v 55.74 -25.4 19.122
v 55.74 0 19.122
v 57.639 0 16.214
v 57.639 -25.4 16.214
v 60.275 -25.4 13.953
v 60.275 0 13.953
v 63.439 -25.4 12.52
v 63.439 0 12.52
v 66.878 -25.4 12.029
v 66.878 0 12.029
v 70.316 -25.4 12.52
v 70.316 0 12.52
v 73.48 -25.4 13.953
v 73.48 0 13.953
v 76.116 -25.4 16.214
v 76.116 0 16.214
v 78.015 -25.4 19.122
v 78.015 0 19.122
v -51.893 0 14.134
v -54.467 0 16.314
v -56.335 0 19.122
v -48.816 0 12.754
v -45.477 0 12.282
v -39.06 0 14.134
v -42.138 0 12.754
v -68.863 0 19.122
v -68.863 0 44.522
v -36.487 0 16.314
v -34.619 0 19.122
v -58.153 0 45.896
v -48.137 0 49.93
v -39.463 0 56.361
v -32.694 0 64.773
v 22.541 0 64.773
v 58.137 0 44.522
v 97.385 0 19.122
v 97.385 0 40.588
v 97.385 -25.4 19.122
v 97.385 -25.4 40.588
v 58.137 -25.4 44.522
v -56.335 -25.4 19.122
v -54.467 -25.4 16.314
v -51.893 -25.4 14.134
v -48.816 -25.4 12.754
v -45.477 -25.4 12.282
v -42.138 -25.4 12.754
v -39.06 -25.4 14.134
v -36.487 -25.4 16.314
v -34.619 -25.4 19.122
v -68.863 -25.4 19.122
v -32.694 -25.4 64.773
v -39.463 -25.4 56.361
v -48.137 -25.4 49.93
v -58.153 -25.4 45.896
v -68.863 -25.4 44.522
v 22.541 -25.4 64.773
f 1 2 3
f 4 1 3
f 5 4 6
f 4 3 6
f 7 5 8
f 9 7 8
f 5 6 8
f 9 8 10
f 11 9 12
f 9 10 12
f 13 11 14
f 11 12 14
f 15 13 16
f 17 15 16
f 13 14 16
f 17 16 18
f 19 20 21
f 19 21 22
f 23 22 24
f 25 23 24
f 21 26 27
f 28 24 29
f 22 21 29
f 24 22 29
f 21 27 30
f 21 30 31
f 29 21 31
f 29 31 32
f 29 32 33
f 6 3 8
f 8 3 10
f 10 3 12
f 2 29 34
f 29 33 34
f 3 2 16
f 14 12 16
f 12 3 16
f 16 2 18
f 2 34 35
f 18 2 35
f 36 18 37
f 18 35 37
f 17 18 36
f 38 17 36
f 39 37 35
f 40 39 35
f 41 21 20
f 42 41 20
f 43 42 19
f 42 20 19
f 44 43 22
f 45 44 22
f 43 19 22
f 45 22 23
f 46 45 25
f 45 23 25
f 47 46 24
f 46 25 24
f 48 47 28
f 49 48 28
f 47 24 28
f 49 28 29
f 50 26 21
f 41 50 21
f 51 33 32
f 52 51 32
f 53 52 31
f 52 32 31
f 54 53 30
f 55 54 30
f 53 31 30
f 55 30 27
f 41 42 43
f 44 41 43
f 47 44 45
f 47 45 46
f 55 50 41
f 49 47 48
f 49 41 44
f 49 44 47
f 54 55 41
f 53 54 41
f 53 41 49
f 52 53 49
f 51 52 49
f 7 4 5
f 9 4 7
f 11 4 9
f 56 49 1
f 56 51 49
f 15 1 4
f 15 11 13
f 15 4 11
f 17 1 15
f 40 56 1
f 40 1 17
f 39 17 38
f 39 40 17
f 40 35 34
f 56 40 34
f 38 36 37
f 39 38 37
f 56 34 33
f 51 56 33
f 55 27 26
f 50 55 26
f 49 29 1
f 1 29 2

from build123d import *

# Parameters (mm, degrees)
F1_DEPTH = 25.4
F2_DEPTH = 25.4
F3_DEPTH = 25.4


with BuildPart() as f1:
    # F0 (on Front) → F1 (new body)
    with BuildSketch(Plane.XZ):
        with BuildLine():
            ThreePointArc((-32.6936654747, 64.7734031081), (-48.13655305, 49.9296563149), (-68.8628588319, 44.5222683907))
            Line((-68.8628588319, 44.5222683907), (58.1371411681, 44.5222683907))
            Line((58.1371411681, 44.5222683907), (22.5408878177, 64.7734031081))
            Line((22.5408878177, 64.7734031081), (-32.6936654747, 64.7734031081))
        make_face()
        with BuildLine():
            Line((58.1371411681, 44.5222683907), (-68.8628588319, 44.5222683907))
            Line((-68.8628588319, 44.5222683907), (-68.8628588319, 19.1222683907))
            Line((-68.8628588319, 19.1222683907), (-56.3345537444, 19.1222683907))
            ThreePointArc((-56.3345537444, 19.1222683907), (-48.1413485784, 36.0579067807), (-33.43944267, 24.3191495538))
            ThreePointArc((-33.43944267, 24.3191495538), (-33.7380519171, 21.6546101194), (-34.6190645437, 19.1222683907))
            Line((-34.6190645437, 19.1222683907), (55.7402772585, 19.1222683907))
            ThreePointArc((55.7402772585, 19.1222683907), (54.7678046883, 26.416830746), (58.1371411681, 32.9593008102))
            Line((58.1371411681, 32.9593008102), (58.1371411681, 44.5222683907))
        make_face()
    extrude(amount=F1_DEPTH)

    # F0 (on Front) → F2 (join)
    with BuildSketch(Plane.XZ):
        with BuildLine():
            ThreePointArc((-32.6936654747, 64.7734031081), (-48.13655305, 49.9296563149), (-68.8628588319, 44.5222683907))
            Line((-68.8628588319, 44.5222683907), (58.1371411681, 44.5222683907))
            Line((58.1371411681, 44.5222683907), (22.5408878177, 64.7734031081))
            Line((22.5408878177, 64.7734031081), (-32.6936654747, 64.7734031081))
        make_face()
        with BuildLine():
            Line((58.1371411681, 44.5222683907), (-68.8628588319, 44.5222683907))
            Line((-68.8628588319, 44.5222683907), (-68.8628588319, 19.1222683907))
            Line((-68.8628588319, 19.1222683907), (-56.3345537444, 19.1222683907))
            ThreePointArc((-56.3345537444, 19.1222683907), (-48.1413485784, 36.0579067807), (-33.43944267, 24.3191495538))
            ThreePointArc((-33.43944267, 24.3191495538), (-33.7380519171, 21.6546101194), (-34.6190645437, 19.1222683907))
            Line((-34.6190645437, 19.1222683907), (55.7402772585, 19.1222683907))
            ThreePointArc((55.7402772585, 19.1222683907), (54.7678046883, 26.416830746), (58.1371411681, 32.9593008102))
            Line((58.1371411681, 32.9593008102), (58.1371411681, 44.5222683907))
        make_face()
        with BuildLine():
            Line((97.3853468895, 40.5878610909), (58.1371411681, 44.5222683907))
            Line((58.1371411681, 44.5222683907), (58.1371411681, 32.9593008102))
            ThreePointArc((58.1371411681, 32.9593008102), (71.5481129353, 35.6873436348), (79.1678599605, 24.3191495538))
            ThreePointArc((79.1678599605, 24.3191495538), (78.8761964322, 21.6575453897), (78.0150490125, 19.1222683907))
            Line((78.0150490125, 19.1222683907), (97.3853468895, 19.1222683907))
            Line((97.3853468895, 19.1222683907), (97.3853468895, 23.5926117748))
            Line((97.3853468895, 23.5926117748), (97.3853468895, 40.5878610909))
        make_face()
        with BuildLine():
            ThreePointArc((79.1678599605, 24.3191495538), (71.5481129353, 35.6873436348), (58.1371411681, 32.9593008102))
            Line((58.1371411681, 32.9593008102), (58.1371411681, 19.1222683907))
            Line((58.1371411681, 19.1222683907), (78.0150490125, 19.1222683907))
            ThreePointArc((78.0150490125, 19.1222683907), (78.8761964322, 21.6575453897), (79.1678599605, 24.3191495538))
        make_face()
        with BuildLine():
            Line((58.1371411681, 19.1222683907), (58.1371411681, 32.9593008102))
            ThreePointArc((58.1371411681, 32.9593008102), (54.7678046883, 26.416830746), (55.7402772585, 19.1222683907))
            Line((55.7402772585, 19.1222683907), (58.1371411681, 19.1222683907))
        make_face()
        with BuildLine():
            ThreePointArc((-33.43944267, 24.3191495538), (-48.1413485784, 36.0579067807), (-56.3345537444, 19.1222683907))
            Line((-56.3345537444, 19.1222683907), (-34.6190645437, 19.1222683907))
            ThreePointArc((-34.6190645437, 19.1222683907), (-33.7380519171, 21.6546101194), (-33.43944267, 24.3191495538))
        make_face()
        with BuildLine():
            Line((-34.6190645437, 19.1222683907), (-56.3345537444, 19.1222683907))
            ThreePointArc((-56.3345537444, 19.1222683907), (-45.476809144, 12.2817830798), (-34.6190645437, 19.1222683907))
        make_face()
        with BuildLine():
            Line((78.0150490125, 19.1222683907), (58.1371411681, 19.1222683907))
            Line((58.1371411681, 19.1222683907), (55.7402772585, 19.1222683907))
            ThreePointArc((55.7402772585, 19.1222683907), (66.8776631355, 12.0289527288), (78.0150490125, 19.1222683907))
        make_face()
    extrude(amount=F2_DEPTH)

    # F0 (on Front) → F3 (join)
    with BuildSketch(Plane.XZ):
        with BuildLine():
            Line((97.3853468895, 40.5878610909), (58.1371411681, 44.5222683907))
            Line((58.1371411681, 44.5222683907), (58.1371411681, 32.9593008102))
            ThreePointArc((58.1371411681, 32.9593008102), (71.5481129353, 35.6873436348), (79.1678599605, 24.3191495538))
            ThreePointArc((79.1678599605, 24.3191495538), (78.8761964322, 21.6575453897), (78.0150490125, 19.1222683907))
            Line((78.0150490125, 19.1222683907), (97.3853468895, 19.1222683907))
            Line((97.3853468895, 19.1222683907), (97.3853468895, 23.5926117748))
            Line((97.3853468895, 23.5926117748), (97.3853468895, 40.5878610909))
        make_face()
        with BuildLine():
            ThreePointArc((79.1678599605, 24.3191495538), (71.5481129353, 35.6873436348), (58.1371411681, 32.9593008102))
            Line((58.1371411681, 32.9593008102), (58.1371411681, 19.1222683907))
            Line((58.1371411681, 19.1222683907), (78.0150490125, 19.1222683907))
            ThreePointArc((78.0150490125, 19.1222683907), (78.8761964322, 21.6575453897), (79.1678599605, 24.3191495538))
        make_face()
    extrude(amount=F3_DEPTH)


solid = f1.part
